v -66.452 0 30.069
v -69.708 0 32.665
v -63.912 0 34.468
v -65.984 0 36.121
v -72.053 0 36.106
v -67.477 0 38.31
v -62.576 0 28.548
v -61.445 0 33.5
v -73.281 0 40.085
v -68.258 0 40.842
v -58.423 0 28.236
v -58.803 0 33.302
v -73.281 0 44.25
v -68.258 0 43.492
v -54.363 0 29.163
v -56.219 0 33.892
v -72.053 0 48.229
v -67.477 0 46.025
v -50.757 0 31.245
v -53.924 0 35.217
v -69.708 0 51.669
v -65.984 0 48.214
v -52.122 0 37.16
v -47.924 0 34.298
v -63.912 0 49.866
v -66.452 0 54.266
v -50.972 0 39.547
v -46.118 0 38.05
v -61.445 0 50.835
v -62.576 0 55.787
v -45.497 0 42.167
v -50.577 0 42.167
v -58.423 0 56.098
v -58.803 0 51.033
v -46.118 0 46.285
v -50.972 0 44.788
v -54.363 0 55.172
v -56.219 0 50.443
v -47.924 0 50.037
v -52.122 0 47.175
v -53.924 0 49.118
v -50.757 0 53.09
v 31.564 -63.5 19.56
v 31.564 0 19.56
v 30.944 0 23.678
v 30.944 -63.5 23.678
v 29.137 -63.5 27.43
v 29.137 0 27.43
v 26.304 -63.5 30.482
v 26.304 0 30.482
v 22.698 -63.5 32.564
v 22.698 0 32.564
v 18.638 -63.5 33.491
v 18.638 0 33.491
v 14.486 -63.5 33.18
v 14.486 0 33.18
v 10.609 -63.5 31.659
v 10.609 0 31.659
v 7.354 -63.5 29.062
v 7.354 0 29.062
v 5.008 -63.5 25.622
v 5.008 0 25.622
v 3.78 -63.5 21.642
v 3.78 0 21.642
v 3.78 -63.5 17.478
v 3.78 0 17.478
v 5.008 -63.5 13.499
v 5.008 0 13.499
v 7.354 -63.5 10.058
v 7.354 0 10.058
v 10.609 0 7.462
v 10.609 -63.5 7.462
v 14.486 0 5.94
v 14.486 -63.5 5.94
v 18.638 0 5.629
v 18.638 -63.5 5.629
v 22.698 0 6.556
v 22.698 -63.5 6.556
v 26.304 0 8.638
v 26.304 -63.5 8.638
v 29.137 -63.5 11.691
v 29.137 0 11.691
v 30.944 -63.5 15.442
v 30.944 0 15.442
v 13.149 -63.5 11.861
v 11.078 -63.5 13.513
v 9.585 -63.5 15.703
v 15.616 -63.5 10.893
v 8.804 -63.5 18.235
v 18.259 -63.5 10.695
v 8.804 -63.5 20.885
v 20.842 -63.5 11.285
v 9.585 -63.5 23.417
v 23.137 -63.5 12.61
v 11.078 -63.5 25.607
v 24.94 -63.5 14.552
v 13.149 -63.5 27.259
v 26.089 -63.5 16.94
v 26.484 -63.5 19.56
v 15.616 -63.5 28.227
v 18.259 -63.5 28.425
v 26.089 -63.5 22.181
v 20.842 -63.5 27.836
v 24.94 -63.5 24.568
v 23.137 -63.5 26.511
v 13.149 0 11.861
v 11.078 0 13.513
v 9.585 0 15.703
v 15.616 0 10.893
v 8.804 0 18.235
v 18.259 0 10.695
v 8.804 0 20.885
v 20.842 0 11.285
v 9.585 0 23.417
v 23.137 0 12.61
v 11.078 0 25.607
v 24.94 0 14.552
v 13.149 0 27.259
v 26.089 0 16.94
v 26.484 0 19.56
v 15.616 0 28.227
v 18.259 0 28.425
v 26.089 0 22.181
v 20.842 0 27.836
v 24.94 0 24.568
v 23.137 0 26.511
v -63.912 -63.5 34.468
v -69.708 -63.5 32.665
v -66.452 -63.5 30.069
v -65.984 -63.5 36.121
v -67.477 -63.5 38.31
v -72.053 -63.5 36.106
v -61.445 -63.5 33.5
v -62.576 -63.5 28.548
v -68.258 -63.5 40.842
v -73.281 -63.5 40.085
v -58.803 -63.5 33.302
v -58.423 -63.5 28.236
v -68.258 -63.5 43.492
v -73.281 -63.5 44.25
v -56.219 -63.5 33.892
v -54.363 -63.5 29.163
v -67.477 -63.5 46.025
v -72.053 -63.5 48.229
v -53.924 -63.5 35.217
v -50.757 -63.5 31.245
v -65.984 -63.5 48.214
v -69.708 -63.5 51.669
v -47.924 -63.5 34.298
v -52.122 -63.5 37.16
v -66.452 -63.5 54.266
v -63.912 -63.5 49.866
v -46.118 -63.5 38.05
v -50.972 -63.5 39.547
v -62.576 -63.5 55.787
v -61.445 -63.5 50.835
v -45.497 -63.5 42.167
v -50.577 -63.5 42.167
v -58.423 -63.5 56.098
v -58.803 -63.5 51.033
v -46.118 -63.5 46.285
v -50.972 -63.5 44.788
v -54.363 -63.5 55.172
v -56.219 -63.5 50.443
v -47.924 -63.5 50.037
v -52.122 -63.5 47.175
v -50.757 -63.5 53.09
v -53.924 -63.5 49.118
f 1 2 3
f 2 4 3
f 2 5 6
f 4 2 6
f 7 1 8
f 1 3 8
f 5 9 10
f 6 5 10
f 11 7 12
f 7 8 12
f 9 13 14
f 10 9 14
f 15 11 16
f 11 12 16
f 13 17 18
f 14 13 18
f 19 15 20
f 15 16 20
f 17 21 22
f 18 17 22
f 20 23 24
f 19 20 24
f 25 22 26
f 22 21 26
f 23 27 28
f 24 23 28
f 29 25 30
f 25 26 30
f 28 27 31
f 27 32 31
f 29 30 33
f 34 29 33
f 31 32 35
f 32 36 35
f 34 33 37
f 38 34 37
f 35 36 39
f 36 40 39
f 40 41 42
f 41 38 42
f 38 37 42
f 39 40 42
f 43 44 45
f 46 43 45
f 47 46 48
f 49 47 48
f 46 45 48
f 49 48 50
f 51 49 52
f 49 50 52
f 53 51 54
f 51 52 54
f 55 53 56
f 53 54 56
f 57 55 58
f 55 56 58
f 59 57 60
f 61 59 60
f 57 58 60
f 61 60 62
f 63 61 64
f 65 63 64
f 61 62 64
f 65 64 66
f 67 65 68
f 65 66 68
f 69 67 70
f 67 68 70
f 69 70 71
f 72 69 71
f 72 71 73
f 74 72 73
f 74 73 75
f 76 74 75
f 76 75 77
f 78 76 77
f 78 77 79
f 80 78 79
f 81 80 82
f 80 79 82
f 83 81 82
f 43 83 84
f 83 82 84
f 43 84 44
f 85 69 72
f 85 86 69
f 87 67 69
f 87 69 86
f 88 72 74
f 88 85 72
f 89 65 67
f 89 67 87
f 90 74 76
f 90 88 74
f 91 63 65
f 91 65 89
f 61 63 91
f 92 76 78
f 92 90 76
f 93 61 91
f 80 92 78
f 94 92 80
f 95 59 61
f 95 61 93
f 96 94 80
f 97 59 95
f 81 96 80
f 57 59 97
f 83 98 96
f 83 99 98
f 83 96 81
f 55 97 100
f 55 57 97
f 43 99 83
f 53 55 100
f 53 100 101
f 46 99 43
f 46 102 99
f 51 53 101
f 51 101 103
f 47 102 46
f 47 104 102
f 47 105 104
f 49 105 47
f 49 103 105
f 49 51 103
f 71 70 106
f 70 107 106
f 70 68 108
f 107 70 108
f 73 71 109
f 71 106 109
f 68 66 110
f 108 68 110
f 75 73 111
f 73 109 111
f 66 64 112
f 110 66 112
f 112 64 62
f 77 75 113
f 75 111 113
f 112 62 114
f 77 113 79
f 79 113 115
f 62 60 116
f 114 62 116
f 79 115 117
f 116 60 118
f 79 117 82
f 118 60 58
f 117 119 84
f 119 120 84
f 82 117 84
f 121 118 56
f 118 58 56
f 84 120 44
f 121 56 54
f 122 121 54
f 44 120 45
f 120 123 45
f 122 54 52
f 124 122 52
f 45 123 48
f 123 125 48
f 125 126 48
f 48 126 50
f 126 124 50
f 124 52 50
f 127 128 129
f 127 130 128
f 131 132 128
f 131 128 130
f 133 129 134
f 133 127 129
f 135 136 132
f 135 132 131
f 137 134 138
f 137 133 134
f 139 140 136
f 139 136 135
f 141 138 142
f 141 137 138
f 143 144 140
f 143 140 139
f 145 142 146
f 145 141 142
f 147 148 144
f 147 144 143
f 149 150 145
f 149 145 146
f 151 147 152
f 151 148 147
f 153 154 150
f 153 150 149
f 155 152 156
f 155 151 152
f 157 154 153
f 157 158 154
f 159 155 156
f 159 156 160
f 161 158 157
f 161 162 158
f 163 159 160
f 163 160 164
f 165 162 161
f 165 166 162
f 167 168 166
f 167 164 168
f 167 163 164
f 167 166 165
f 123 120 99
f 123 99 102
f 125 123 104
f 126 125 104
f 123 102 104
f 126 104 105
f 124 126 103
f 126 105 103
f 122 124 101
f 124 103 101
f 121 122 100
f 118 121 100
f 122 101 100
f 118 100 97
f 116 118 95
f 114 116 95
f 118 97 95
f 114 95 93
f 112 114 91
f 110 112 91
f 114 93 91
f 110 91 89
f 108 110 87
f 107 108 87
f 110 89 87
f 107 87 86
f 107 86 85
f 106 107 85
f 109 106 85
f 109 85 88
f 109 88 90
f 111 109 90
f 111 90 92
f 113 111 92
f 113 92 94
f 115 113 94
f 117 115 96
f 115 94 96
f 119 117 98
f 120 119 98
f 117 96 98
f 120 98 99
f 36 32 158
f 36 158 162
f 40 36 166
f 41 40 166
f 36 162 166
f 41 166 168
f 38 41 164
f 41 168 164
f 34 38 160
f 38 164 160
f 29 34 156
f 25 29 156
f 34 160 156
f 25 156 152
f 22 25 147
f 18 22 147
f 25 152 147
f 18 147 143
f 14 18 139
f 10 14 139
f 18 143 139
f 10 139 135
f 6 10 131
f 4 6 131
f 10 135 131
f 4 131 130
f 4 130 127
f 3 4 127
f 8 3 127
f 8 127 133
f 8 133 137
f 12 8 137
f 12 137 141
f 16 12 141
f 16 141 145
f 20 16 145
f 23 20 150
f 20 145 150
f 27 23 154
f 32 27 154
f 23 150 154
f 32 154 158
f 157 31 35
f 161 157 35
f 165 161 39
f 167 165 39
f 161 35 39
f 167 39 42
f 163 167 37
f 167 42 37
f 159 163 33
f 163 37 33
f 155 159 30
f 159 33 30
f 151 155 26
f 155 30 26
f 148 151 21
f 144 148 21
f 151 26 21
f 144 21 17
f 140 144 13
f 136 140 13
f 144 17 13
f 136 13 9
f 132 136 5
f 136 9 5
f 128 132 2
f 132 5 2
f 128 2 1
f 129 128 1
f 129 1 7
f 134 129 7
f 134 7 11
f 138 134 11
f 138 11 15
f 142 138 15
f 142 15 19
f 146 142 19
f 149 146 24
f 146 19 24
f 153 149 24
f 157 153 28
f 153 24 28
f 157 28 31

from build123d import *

# Parameters (mm, degrees)
F0_R     = 13.97
F1_DEPTH = 63.5
F2_R     = 8.89
F3_DEPTH = 63.5
F4_R     = 8.89
F5_DEPTH = 63.5


with BuildPart() as f1:
    # F0 (on Front) → F1 (new body)
    with BuildSketch(Plane.XZ):
        with Locations((-59.466895, 42.167433)):
            Circle(F0_R)
        with Locations((17.594336, 19.560184)):
            Circle(F0_R)
    extrude(amount=F1_DEPTH)

    # F2 (on face) → F3 (cut)
    with BuildSketch(Plane.XZ.offset(63.5)):
        with Locations((-59.466895, 42.167433)):
            Circle(F2_R)
    extrude(amount=-F3_DEPTH, mode=Mode.SUBTRACT)

    # F4 (on face) → F5 (cut)
    with BuildSketch(Plane.XZ.offset(63.5)):
        with Locations((17.594336, 19.560184)):
            Circle(F4_R)
    extrude(amount=-F5_DEPTH, mode=Mode.SUBTRACT)


solid = f1.part
